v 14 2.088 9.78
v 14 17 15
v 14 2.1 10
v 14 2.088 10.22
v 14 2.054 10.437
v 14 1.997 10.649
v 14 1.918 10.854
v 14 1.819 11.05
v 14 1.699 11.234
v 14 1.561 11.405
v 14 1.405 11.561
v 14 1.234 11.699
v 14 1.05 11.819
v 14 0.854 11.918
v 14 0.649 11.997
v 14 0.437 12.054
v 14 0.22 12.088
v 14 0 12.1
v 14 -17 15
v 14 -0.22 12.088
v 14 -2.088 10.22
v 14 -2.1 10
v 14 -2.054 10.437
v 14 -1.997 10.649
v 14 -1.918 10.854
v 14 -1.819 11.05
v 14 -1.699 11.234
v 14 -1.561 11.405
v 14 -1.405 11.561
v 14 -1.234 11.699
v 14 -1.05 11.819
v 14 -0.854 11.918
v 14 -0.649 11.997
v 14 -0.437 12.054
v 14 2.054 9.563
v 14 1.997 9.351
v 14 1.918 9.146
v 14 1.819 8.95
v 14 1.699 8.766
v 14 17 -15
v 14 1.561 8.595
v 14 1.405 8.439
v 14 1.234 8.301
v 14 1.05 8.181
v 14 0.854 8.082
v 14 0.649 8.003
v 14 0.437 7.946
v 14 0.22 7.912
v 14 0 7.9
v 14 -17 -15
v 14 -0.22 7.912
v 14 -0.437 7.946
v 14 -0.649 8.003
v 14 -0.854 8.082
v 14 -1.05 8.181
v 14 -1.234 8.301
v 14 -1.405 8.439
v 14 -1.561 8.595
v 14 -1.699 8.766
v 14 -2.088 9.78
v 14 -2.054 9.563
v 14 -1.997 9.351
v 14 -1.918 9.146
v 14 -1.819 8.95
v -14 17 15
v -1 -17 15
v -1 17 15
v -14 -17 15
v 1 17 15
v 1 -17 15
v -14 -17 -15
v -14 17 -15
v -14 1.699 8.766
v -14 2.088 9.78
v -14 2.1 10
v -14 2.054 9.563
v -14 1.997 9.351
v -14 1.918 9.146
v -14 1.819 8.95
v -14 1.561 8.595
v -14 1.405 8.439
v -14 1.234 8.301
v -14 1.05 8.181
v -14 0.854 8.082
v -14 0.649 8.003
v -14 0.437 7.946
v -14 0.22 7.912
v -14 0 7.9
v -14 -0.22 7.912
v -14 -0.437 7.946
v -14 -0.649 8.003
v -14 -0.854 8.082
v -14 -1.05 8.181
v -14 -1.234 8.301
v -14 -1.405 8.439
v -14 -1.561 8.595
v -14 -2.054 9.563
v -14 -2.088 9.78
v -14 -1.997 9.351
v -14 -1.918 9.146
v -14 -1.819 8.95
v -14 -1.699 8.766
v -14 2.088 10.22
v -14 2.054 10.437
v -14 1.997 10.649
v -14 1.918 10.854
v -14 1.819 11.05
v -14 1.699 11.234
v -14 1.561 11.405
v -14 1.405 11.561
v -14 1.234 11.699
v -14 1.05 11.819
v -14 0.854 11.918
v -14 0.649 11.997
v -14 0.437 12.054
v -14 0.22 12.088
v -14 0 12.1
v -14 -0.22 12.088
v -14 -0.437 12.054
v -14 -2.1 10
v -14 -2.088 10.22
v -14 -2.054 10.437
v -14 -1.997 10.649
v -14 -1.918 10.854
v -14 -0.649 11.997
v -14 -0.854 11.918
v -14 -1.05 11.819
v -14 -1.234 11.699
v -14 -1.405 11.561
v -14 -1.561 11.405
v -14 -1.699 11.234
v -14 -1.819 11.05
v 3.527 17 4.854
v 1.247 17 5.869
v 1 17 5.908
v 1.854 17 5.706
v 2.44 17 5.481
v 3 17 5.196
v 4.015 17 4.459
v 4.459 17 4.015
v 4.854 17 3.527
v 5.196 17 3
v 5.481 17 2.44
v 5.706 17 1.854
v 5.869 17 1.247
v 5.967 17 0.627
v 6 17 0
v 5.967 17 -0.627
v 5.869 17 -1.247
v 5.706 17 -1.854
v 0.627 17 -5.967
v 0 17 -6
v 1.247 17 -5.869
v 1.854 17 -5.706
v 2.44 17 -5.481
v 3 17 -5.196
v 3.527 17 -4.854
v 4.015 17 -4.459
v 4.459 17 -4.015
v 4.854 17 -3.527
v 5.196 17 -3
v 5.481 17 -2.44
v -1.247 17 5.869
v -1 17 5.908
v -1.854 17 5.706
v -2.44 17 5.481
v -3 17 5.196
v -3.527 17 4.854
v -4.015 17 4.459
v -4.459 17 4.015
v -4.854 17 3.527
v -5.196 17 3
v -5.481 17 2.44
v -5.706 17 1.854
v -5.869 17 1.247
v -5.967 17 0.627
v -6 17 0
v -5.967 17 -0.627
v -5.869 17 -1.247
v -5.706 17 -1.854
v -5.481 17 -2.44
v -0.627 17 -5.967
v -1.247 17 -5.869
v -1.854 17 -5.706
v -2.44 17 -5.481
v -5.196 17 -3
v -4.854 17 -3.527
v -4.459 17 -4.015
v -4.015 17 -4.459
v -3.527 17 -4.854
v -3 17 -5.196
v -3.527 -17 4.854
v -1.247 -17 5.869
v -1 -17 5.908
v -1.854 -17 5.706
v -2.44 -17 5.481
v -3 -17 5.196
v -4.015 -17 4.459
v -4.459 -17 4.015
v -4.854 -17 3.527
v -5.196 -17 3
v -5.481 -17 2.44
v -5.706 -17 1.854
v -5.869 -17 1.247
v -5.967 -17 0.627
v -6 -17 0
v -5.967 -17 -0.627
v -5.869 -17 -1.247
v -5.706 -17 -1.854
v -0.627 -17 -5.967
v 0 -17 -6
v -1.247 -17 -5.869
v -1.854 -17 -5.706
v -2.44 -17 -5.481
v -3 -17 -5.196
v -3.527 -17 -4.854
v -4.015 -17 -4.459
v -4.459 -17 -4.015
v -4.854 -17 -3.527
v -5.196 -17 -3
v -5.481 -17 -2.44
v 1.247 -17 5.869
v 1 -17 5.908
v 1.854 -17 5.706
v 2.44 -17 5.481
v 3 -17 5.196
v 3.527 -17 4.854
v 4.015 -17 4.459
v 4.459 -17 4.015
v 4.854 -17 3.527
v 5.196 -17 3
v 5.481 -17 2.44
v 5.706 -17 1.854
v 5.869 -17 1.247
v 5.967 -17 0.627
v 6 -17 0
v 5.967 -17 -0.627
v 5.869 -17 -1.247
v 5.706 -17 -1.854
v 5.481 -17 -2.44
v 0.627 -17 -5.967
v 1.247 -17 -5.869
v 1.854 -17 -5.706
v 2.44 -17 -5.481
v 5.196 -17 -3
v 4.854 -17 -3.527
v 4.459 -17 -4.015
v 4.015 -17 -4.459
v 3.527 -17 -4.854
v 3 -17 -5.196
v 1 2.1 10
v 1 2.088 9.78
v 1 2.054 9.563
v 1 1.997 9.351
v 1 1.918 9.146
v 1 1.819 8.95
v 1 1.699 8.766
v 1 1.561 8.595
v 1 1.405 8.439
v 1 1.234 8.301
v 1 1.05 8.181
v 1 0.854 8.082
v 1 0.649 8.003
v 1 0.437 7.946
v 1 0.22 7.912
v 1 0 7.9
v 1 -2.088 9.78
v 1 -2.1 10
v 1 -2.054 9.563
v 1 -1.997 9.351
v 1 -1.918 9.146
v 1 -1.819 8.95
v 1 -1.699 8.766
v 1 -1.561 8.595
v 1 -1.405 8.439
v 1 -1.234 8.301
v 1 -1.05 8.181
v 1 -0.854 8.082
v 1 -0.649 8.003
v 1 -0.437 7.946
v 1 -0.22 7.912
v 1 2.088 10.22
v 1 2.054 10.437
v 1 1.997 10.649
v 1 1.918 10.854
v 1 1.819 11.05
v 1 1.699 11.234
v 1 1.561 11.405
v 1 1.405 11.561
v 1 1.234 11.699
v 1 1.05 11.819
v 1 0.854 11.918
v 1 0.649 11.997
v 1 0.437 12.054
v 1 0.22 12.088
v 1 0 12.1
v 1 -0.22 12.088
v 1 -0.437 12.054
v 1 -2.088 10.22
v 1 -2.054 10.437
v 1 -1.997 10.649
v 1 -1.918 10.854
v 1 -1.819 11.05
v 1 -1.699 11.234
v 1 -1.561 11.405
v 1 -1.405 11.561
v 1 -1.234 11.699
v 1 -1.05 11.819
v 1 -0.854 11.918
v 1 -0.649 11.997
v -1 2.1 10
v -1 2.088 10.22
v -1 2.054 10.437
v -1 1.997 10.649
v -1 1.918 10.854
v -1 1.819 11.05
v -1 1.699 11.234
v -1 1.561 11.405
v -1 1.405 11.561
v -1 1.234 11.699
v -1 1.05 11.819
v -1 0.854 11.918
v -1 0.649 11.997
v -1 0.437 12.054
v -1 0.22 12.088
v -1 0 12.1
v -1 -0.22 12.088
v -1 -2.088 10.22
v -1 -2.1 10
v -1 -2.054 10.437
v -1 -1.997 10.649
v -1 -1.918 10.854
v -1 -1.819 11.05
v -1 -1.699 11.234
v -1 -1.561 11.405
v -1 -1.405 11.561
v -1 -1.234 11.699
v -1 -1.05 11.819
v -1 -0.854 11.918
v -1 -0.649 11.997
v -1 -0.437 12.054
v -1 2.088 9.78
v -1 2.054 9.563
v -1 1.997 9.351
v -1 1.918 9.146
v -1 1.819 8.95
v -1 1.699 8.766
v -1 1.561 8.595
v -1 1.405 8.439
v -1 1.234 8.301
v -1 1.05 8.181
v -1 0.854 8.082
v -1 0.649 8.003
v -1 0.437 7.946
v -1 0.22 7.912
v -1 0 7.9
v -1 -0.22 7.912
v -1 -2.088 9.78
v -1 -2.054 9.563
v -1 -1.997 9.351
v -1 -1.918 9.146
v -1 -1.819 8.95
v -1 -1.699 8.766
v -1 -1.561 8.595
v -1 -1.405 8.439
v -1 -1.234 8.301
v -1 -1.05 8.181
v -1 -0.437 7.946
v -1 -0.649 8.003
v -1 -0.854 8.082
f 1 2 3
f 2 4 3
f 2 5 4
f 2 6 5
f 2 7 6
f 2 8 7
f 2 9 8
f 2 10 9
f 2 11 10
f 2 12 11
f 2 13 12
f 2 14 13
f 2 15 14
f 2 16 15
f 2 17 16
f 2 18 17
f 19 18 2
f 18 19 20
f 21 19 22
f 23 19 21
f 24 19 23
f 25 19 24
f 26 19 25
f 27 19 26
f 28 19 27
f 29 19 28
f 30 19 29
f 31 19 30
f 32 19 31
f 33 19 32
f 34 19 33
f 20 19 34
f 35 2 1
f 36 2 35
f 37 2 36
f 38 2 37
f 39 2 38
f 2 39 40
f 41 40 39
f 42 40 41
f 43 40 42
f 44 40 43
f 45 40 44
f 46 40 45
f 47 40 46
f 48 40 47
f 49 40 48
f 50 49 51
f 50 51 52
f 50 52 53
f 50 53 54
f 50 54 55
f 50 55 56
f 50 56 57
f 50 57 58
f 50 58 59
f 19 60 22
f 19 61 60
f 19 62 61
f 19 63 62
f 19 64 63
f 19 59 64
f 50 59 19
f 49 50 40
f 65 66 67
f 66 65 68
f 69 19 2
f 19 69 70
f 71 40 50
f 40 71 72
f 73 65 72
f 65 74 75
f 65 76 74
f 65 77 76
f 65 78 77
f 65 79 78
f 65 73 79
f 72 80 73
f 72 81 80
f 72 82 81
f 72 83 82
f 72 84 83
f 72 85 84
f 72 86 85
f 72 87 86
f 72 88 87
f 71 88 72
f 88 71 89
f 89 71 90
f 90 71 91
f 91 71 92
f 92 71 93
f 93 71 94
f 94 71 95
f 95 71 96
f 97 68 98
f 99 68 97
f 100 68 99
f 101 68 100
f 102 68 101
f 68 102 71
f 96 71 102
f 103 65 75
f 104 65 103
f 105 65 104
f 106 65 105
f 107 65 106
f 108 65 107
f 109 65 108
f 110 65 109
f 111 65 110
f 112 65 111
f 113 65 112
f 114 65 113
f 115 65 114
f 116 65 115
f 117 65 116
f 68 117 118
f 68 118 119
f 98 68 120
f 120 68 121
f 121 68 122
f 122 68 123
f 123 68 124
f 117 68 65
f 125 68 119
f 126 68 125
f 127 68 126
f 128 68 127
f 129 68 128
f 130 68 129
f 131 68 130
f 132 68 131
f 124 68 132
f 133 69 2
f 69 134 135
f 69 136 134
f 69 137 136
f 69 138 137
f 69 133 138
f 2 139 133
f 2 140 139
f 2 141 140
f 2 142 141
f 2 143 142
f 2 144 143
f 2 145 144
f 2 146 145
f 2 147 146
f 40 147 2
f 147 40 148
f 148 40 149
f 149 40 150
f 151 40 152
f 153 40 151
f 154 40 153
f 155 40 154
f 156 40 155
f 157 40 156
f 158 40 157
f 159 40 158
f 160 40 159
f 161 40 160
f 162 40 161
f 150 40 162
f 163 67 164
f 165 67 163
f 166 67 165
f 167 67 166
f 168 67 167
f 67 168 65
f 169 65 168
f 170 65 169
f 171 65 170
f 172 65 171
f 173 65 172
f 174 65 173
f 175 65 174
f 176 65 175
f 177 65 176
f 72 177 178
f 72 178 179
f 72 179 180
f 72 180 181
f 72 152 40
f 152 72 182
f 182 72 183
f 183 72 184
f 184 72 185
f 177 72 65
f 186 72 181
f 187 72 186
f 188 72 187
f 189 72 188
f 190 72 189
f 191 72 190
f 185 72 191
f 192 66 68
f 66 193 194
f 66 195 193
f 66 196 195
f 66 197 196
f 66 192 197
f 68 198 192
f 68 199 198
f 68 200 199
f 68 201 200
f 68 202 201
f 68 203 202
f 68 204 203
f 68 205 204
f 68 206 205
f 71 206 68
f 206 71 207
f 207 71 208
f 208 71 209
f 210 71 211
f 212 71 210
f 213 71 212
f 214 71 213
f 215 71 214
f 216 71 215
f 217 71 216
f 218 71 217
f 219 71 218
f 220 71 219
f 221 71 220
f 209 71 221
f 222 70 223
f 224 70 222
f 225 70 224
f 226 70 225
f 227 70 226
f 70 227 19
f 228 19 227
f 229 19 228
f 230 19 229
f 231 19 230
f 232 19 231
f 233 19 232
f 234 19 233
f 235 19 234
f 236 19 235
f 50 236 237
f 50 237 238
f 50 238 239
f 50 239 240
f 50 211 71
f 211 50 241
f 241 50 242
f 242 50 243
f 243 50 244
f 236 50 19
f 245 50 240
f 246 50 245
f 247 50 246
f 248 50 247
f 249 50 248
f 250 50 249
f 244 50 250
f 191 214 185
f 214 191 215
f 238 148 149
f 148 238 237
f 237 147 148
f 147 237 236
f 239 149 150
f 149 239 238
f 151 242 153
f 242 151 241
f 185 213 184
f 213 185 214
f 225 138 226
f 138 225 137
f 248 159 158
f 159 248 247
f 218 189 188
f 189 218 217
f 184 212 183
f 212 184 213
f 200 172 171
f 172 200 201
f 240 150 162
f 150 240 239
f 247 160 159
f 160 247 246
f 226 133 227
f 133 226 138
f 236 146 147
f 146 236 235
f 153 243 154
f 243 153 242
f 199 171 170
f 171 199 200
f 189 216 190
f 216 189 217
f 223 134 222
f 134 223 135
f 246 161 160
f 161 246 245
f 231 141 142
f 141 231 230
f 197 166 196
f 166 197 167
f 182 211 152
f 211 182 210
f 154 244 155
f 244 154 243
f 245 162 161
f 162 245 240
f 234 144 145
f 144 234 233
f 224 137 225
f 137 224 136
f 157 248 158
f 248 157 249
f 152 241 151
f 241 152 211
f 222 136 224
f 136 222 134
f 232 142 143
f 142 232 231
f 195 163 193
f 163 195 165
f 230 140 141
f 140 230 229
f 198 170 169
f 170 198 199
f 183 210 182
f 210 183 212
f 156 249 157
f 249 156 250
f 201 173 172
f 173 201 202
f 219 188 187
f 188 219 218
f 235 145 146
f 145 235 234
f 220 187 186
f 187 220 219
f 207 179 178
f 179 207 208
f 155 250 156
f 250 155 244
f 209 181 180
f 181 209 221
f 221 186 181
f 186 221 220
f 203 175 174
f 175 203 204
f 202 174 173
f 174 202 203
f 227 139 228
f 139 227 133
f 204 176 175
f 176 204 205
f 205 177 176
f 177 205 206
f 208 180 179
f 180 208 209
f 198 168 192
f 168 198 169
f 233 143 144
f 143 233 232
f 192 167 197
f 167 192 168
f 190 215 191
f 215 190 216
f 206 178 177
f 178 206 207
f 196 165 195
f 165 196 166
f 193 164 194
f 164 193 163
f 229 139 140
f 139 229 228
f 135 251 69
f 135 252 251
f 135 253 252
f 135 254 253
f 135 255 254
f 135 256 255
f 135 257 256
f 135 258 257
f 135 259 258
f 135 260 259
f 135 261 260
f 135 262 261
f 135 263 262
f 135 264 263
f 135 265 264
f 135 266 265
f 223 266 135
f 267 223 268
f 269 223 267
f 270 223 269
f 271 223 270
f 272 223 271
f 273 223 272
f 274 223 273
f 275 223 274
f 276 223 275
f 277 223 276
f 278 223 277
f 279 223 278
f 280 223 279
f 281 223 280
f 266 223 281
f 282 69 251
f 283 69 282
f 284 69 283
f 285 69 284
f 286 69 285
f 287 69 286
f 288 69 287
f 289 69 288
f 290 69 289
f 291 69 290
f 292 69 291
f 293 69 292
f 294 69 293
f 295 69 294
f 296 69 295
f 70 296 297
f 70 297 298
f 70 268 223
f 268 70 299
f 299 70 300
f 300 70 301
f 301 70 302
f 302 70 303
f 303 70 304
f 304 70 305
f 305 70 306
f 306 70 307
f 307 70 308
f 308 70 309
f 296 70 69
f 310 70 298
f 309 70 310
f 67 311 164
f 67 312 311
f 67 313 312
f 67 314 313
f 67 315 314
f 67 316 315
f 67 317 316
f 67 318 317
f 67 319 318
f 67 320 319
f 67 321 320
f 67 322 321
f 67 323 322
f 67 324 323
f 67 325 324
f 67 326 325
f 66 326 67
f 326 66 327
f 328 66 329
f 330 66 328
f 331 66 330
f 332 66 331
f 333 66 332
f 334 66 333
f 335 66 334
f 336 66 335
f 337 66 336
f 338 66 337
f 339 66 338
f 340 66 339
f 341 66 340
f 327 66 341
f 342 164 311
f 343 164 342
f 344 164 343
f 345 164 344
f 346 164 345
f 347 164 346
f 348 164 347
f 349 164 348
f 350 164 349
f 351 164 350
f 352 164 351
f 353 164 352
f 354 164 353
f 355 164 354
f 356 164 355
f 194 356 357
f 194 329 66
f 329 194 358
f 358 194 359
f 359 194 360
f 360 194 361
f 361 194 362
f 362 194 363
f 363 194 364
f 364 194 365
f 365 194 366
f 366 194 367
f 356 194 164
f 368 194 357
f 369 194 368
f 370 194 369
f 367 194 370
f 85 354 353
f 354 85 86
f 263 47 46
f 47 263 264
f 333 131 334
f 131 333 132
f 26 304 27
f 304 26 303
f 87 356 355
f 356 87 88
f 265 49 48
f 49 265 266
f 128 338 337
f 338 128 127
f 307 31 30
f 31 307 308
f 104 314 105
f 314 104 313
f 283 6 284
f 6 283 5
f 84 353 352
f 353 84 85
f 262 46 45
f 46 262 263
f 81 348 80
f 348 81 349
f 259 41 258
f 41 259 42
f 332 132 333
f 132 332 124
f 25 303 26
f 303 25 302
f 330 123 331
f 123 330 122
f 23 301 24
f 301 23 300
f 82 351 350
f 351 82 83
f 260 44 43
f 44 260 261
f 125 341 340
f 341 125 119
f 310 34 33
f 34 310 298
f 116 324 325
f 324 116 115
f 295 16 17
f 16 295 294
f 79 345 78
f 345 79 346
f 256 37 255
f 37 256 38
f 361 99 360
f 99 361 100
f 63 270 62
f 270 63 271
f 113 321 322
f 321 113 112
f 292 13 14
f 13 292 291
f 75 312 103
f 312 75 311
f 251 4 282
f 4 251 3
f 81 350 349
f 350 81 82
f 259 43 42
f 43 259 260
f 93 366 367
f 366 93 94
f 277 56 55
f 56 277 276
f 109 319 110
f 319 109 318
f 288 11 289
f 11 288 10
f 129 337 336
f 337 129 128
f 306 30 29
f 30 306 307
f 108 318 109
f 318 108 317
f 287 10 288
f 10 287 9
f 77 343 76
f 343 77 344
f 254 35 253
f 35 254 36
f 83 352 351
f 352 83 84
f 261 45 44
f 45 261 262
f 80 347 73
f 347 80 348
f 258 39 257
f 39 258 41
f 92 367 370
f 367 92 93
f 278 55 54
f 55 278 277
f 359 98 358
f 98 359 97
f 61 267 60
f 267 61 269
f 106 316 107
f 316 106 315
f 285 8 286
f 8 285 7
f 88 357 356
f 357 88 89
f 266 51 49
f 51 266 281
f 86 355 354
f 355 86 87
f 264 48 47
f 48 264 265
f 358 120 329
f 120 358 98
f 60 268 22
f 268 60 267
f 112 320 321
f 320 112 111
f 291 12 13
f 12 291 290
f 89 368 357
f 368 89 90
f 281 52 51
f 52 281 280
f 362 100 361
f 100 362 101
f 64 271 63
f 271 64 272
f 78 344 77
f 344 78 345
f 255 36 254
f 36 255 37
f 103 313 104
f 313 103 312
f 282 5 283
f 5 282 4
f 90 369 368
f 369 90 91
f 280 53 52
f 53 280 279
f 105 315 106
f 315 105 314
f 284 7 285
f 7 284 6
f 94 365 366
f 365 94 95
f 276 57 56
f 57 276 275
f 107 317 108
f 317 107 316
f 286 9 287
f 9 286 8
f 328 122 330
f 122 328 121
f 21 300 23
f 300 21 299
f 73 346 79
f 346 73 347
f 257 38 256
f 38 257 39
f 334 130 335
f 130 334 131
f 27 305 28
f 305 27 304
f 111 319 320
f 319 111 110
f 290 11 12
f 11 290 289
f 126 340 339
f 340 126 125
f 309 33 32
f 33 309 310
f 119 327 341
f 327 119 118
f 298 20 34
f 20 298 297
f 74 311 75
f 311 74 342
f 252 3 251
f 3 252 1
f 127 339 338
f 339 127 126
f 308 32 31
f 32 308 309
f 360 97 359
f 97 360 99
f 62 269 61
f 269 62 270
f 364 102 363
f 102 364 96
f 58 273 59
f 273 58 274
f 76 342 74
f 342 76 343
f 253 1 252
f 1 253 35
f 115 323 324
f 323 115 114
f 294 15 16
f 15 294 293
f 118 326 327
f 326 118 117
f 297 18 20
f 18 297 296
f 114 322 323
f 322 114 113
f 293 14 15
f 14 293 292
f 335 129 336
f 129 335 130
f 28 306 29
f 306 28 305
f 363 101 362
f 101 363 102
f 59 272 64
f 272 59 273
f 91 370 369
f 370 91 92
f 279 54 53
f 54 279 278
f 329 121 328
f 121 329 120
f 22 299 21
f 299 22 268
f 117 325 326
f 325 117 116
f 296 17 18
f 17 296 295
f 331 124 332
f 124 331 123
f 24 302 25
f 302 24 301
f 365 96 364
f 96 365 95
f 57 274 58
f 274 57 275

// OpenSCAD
// Split clamp block.
$fn = 60;
eps = 0.02;
bore_d = 12;
body_w = 34;
body_h = 30;
body_l = 28;
slot_w = 2;
difference() {
    cube([body_l, body_w, body_h], center = true);
    translate([0, -body_w / 2 - eps, 0]) rotate([-90,0,0]) cylinder(d = bore_d, h = body_w + 2 * eps);
    translate([-slot_w / 2, -body_w / 2 - eps, 0]) cube([slot_w, body_w + 2 * eps, body_h / 2 + eps]);
    translate([-body_l / 2 - eps, 0, body_h / 2 - 5]) rotate([0,90,0]) cylinder(d = 4.2, h = body_l + 2 * eps);
}
